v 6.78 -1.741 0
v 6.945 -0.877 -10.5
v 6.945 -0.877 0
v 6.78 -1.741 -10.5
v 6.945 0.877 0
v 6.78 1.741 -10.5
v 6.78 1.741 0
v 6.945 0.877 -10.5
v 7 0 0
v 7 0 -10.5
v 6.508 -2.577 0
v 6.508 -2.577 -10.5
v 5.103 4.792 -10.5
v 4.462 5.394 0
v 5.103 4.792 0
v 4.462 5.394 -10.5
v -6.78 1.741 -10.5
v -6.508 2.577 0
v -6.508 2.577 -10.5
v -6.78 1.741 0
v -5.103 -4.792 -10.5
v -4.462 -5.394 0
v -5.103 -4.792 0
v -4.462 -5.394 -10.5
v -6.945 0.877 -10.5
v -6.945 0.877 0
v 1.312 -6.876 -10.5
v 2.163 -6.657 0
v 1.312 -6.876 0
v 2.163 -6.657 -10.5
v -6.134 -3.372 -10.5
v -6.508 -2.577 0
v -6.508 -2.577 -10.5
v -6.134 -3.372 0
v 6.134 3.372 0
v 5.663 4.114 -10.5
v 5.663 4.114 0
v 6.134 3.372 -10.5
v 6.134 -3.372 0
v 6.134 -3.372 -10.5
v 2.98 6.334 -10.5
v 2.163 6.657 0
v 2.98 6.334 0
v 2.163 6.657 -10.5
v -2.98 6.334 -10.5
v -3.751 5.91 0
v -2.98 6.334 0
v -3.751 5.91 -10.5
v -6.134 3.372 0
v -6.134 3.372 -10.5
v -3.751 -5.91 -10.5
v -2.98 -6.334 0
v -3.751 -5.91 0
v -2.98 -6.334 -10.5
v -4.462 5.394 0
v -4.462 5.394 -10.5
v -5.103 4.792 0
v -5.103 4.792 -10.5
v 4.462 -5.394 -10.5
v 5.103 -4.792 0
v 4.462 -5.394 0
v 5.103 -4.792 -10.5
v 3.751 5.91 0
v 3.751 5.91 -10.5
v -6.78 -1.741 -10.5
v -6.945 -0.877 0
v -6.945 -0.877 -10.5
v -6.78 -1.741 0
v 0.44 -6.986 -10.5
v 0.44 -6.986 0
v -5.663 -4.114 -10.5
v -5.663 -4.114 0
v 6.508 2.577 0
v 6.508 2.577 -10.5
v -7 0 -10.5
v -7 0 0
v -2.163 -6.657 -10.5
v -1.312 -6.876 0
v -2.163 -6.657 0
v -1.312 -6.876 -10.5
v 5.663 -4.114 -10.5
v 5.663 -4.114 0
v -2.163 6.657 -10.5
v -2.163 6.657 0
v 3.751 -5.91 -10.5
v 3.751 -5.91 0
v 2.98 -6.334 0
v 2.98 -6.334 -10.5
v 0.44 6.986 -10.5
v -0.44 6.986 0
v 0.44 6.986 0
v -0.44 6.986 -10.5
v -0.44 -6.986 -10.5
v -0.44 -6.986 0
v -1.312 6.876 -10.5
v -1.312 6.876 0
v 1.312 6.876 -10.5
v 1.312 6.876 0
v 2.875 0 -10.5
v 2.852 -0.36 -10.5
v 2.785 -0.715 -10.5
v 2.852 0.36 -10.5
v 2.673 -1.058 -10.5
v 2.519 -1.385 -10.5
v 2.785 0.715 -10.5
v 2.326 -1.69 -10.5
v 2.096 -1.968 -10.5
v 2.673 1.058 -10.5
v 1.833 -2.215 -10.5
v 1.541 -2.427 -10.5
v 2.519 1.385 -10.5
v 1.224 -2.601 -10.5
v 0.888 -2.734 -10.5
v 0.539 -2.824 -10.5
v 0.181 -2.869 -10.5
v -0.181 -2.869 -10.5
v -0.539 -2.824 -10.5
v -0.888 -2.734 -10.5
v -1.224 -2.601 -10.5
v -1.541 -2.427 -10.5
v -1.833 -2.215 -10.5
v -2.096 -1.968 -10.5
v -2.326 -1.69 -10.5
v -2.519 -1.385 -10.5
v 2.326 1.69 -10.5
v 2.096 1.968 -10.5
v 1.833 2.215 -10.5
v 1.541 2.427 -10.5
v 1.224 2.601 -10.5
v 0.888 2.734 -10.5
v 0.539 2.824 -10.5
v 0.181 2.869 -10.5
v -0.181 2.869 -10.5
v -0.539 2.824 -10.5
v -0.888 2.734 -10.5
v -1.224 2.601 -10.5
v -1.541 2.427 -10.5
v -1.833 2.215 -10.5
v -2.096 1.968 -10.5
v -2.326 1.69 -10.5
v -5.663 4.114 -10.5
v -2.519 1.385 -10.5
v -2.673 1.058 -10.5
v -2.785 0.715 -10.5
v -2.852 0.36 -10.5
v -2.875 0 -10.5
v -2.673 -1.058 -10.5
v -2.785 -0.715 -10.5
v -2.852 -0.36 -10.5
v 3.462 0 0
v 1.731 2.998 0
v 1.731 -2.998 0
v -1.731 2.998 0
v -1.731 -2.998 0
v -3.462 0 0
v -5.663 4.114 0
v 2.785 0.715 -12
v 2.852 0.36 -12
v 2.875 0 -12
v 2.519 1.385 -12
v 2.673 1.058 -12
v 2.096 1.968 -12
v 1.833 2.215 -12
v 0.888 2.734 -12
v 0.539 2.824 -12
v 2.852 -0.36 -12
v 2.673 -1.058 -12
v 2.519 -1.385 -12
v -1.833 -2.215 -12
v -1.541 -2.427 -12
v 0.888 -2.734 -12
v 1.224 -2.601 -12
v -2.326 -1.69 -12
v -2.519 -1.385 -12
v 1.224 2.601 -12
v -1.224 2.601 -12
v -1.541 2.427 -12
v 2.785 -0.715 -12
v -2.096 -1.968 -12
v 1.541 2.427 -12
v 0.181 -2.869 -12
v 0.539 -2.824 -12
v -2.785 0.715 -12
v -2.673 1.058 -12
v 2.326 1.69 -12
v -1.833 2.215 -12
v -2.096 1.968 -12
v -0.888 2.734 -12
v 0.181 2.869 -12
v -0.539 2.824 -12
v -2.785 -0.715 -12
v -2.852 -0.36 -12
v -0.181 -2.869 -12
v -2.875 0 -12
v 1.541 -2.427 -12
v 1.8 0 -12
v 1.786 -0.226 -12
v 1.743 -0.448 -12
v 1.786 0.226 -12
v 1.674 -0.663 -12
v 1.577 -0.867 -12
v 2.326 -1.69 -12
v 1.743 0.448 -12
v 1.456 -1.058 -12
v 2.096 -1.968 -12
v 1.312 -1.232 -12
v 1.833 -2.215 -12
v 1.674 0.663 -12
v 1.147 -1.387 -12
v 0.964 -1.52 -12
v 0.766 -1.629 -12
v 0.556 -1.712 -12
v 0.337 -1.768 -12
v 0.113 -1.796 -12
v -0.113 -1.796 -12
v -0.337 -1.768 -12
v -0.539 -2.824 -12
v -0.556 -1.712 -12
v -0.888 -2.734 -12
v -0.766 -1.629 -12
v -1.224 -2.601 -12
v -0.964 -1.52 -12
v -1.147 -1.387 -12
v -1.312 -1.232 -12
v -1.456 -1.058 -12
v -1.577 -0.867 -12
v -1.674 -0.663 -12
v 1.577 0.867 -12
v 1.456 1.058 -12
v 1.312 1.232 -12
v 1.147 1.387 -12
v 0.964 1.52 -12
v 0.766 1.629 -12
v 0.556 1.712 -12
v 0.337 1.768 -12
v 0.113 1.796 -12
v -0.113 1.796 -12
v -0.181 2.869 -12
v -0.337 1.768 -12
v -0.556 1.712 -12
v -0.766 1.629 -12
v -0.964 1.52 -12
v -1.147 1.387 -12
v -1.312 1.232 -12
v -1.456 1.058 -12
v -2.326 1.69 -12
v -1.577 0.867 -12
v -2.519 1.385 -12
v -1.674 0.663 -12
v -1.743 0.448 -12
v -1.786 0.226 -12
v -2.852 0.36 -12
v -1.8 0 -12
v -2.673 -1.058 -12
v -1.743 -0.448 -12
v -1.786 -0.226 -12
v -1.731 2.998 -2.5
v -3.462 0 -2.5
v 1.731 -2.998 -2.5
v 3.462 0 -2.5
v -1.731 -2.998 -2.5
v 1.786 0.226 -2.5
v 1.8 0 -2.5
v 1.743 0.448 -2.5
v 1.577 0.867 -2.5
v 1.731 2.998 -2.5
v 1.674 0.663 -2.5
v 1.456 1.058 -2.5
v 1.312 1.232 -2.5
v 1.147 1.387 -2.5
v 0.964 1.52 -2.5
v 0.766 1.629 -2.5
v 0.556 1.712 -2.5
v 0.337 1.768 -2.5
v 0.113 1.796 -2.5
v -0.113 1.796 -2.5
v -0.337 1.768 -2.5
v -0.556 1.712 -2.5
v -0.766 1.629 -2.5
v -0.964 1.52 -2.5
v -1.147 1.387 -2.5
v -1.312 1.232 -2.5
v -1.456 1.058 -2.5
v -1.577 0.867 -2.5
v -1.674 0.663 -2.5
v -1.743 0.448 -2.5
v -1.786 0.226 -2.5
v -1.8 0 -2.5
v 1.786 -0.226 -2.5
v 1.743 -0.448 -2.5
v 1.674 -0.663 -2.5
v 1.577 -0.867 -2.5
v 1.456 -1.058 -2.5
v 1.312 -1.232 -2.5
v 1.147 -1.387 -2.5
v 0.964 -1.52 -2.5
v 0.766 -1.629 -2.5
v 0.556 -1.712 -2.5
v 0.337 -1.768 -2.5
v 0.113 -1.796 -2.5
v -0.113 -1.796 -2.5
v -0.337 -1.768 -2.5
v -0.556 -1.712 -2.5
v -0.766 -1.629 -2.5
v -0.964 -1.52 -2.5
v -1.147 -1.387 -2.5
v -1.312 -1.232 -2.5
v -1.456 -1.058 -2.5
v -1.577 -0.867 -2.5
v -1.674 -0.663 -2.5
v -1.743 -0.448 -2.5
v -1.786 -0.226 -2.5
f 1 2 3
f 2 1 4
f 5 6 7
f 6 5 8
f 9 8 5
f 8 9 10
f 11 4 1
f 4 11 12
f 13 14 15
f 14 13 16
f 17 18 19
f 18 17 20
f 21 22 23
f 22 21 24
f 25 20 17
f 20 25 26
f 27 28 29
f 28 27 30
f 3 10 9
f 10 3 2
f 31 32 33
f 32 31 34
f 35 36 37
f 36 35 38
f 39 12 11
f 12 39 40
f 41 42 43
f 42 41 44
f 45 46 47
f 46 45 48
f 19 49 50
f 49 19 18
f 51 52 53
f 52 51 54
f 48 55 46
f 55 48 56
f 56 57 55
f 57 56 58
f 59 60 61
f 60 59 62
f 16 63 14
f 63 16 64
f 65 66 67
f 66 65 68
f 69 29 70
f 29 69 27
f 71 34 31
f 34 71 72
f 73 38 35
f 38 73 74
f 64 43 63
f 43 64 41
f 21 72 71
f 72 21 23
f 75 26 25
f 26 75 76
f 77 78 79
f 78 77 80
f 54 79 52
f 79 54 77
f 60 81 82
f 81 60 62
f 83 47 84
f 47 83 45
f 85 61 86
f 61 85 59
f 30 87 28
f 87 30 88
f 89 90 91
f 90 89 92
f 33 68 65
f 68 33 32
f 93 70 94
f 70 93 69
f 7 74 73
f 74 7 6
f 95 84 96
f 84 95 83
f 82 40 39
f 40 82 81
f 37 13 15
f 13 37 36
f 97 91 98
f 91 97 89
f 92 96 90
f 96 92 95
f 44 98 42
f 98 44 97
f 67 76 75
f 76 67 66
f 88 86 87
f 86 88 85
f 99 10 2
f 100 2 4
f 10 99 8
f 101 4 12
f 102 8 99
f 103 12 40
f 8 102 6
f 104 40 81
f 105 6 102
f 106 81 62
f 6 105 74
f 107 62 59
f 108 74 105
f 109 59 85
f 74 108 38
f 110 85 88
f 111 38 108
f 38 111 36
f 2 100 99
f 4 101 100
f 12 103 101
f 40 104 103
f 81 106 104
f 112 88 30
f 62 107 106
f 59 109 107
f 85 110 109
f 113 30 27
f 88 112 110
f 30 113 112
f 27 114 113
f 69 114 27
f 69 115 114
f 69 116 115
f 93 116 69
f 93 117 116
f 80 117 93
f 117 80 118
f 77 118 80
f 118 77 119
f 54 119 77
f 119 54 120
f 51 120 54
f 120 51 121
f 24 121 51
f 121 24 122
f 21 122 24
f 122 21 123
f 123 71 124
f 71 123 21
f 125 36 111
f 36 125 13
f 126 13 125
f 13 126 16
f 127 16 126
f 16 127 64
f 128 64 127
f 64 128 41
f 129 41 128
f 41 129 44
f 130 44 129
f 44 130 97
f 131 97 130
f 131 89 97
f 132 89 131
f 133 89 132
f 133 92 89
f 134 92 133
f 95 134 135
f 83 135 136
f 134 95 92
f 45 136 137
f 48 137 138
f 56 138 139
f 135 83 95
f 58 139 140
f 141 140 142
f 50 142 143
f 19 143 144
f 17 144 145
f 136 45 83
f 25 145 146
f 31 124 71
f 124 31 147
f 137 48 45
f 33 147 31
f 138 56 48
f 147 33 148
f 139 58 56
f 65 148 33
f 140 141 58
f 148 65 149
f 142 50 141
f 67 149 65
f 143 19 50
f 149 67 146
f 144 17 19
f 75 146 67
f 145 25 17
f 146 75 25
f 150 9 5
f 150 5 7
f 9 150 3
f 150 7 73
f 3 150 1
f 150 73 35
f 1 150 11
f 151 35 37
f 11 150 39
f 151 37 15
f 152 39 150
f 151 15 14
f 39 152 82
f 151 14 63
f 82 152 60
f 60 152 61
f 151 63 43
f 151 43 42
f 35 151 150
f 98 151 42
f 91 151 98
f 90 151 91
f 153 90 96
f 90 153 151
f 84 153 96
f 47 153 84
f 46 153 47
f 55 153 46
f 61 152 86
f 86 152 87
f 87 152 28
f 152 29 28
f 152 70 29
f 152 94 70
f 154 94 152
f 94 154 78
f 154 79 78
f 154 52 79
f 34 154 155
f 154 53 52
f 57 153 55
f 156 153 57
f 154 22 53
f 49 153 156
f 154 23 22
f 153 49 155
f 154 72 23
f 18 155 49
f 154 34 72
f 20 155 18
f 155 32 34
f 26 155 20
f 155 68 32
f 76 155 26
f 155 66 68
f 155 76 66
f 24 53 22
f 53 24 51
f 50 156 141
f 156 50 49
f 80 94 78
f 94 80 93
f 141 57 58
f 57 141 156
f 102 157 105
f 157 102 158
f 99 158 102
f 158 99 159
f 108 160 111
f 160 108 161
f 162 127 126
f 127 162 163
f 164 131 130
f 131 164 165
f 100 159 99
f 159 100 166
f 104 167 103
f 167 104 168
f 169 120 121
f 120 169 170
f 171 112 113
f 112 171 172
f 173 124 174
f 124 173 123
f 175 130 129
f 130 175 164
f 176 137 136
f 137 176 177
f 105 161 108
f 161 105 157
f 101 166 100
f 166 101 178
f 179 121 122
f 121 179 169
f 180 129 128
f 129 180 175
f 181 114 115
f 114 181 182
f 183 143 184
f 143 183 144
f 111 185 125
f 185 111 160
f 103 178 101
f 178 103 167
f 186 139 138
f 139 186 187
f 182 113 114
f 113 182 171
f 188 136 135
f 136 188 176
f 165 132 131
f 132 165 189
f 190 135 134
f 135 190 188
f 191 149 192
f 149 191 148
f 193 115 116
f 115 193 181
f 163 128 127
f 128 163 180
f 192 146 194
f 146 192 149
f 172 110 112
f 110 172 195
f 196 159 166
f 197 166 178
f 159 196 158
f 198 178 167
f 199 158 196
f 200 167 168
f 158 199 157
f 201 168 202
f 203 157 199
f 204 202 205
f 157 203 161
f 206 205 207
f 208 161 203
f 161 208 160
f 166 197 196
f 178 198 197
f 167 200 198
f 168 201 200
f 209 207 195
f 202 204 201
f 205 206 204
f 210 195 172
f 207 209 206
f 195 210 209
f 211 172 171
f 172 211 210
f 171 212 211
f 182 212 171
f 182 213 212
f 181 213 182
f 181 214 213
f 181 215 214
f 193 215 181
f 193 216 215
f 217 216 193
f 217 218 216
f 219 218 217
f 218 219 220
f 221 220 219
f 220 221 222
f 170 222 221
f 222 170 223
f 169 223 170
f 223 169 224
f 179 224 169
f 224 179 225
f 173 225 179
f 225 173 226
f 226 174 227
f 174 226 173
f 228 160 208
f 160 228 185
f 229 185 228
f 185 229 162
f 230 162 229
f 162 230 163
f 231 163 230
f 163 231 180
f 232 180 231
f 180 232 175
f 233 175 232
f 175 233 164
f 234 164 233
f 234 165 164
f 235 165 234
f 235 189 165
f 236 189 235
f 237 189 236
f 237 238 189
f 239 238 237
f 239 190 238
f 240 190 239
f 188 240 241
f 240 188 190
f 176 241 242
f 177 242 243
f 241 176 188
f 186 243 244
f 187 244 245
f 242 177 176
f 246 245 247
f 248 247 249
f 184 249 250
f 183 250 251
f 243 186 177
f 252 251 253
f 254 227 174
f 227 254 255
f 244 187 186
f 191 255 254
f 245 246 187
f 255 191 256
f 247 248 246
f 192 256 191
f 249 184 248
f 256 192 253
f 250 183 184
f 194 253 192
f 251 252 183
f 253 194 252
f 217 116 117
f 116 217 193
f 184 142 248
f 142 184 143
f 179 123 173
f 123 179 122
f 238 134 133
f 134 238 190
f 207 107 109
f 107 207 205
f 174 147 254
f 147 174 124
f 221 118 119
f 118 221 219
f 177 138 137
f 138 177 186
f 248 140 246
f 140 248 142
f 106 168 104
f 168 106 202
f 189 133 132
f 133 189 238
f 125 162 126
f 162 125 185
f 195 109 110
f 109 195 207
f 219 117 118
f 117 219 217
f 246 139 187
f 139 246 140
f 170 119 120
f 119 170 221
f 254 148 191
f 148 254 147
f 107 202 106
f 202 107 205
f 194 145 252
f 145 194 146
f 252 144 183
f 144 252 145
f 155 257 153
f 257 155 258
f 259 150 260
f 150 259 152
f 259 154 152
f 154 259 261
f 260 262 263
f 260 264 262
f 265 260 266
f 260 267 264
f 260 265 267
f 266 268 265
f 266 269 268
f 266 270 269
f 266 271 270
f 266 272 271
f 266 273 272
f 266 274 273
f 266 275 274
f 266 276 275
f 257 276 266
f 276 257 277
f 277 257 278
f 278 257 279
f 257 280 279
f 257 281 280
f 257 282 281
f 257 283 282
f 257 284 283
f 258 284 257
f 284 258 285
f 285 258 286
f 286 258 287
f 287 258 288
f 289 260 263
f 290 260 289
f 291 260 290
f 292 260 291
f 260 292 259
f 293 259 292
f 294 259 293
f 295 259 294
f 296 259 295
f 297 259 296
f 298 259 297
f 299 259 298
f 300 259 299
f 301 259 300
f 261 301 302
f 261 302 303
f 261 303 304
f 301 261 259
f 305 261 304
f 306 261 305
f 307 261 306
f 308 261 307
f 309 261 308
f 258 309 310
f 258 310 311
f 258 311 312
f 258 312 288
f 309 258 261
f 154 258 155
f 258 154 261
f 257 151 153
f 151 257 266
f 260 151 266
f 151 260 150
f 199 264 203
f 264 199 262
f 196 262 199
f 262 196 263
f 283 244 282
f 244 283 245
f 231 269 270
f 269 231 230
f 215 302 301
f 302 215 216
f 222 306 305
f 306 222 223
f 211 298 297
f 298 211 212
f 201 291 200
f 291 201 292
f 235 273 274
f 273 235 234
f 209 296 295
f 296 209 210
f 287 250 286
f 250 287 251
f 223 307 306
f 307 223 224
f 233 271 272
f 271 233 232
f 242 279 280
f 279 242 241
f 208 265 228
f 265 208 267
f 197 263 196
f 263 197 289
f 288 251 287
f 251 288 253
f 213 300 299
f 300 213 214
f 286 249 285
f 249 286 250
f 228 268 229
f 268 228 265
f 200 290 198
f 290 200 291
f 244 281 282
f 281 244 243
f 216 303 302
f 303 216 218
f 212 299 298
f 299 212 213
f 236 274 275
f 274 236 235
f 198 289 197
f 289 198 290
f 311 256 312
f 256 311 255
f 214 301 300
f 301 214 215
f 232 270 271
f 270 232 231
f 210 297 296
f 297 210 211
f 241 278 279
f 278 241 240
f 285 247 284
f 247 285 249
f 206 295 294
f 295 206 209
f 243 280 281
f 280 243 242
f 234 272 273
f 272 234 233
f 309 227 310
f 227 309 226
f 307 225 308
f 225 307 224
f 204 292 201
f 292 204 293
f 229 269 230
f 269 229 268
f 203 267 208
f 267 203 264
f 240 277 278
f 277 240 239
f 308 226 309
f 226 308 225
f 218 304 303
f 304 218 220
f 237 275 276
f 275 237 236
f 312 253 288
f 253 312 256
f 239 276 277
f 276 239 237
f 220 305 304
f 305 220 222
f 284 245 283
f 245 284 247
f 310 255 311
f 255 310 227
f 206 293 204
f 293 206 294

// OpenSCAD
$fn = 50;

difference() {
	union() {
		translate(v = [0, 0, -10.5]) {
			cylinder(h = 10.5, r = 7.0);
		}
		#translate(v = [0, 0, -12.0]) {
			cylinder(h = 12, r = 2.875);
		}
	}
	union() {
		translate(v = [0, 0, 0]) {
			rotate(a = [0, 0, 0]) {
				difference() {
					union() {
						translate(v = [0, 0, -2.5]) {
							linear_extrude(height = 2.5) {
								polygon(points = [[3.4619999999999997, 0.0], [1.7310000000000003, 2.9981799479017264], [-1.7309999999999992, 2.9981799479017264], [-3.4619999999999997, 4.2397272186481365e-16], [-1.7310000000000014, -2.998179947901726], [1.7309999999999977, -2.9981799479017277]]);
							}
						}
					}
					union();
				}
			}
		}
		#translate(v = [0, 0, -100.0]) {
			cylinder(h = 200, r = 1.8);
		}
	}
}
